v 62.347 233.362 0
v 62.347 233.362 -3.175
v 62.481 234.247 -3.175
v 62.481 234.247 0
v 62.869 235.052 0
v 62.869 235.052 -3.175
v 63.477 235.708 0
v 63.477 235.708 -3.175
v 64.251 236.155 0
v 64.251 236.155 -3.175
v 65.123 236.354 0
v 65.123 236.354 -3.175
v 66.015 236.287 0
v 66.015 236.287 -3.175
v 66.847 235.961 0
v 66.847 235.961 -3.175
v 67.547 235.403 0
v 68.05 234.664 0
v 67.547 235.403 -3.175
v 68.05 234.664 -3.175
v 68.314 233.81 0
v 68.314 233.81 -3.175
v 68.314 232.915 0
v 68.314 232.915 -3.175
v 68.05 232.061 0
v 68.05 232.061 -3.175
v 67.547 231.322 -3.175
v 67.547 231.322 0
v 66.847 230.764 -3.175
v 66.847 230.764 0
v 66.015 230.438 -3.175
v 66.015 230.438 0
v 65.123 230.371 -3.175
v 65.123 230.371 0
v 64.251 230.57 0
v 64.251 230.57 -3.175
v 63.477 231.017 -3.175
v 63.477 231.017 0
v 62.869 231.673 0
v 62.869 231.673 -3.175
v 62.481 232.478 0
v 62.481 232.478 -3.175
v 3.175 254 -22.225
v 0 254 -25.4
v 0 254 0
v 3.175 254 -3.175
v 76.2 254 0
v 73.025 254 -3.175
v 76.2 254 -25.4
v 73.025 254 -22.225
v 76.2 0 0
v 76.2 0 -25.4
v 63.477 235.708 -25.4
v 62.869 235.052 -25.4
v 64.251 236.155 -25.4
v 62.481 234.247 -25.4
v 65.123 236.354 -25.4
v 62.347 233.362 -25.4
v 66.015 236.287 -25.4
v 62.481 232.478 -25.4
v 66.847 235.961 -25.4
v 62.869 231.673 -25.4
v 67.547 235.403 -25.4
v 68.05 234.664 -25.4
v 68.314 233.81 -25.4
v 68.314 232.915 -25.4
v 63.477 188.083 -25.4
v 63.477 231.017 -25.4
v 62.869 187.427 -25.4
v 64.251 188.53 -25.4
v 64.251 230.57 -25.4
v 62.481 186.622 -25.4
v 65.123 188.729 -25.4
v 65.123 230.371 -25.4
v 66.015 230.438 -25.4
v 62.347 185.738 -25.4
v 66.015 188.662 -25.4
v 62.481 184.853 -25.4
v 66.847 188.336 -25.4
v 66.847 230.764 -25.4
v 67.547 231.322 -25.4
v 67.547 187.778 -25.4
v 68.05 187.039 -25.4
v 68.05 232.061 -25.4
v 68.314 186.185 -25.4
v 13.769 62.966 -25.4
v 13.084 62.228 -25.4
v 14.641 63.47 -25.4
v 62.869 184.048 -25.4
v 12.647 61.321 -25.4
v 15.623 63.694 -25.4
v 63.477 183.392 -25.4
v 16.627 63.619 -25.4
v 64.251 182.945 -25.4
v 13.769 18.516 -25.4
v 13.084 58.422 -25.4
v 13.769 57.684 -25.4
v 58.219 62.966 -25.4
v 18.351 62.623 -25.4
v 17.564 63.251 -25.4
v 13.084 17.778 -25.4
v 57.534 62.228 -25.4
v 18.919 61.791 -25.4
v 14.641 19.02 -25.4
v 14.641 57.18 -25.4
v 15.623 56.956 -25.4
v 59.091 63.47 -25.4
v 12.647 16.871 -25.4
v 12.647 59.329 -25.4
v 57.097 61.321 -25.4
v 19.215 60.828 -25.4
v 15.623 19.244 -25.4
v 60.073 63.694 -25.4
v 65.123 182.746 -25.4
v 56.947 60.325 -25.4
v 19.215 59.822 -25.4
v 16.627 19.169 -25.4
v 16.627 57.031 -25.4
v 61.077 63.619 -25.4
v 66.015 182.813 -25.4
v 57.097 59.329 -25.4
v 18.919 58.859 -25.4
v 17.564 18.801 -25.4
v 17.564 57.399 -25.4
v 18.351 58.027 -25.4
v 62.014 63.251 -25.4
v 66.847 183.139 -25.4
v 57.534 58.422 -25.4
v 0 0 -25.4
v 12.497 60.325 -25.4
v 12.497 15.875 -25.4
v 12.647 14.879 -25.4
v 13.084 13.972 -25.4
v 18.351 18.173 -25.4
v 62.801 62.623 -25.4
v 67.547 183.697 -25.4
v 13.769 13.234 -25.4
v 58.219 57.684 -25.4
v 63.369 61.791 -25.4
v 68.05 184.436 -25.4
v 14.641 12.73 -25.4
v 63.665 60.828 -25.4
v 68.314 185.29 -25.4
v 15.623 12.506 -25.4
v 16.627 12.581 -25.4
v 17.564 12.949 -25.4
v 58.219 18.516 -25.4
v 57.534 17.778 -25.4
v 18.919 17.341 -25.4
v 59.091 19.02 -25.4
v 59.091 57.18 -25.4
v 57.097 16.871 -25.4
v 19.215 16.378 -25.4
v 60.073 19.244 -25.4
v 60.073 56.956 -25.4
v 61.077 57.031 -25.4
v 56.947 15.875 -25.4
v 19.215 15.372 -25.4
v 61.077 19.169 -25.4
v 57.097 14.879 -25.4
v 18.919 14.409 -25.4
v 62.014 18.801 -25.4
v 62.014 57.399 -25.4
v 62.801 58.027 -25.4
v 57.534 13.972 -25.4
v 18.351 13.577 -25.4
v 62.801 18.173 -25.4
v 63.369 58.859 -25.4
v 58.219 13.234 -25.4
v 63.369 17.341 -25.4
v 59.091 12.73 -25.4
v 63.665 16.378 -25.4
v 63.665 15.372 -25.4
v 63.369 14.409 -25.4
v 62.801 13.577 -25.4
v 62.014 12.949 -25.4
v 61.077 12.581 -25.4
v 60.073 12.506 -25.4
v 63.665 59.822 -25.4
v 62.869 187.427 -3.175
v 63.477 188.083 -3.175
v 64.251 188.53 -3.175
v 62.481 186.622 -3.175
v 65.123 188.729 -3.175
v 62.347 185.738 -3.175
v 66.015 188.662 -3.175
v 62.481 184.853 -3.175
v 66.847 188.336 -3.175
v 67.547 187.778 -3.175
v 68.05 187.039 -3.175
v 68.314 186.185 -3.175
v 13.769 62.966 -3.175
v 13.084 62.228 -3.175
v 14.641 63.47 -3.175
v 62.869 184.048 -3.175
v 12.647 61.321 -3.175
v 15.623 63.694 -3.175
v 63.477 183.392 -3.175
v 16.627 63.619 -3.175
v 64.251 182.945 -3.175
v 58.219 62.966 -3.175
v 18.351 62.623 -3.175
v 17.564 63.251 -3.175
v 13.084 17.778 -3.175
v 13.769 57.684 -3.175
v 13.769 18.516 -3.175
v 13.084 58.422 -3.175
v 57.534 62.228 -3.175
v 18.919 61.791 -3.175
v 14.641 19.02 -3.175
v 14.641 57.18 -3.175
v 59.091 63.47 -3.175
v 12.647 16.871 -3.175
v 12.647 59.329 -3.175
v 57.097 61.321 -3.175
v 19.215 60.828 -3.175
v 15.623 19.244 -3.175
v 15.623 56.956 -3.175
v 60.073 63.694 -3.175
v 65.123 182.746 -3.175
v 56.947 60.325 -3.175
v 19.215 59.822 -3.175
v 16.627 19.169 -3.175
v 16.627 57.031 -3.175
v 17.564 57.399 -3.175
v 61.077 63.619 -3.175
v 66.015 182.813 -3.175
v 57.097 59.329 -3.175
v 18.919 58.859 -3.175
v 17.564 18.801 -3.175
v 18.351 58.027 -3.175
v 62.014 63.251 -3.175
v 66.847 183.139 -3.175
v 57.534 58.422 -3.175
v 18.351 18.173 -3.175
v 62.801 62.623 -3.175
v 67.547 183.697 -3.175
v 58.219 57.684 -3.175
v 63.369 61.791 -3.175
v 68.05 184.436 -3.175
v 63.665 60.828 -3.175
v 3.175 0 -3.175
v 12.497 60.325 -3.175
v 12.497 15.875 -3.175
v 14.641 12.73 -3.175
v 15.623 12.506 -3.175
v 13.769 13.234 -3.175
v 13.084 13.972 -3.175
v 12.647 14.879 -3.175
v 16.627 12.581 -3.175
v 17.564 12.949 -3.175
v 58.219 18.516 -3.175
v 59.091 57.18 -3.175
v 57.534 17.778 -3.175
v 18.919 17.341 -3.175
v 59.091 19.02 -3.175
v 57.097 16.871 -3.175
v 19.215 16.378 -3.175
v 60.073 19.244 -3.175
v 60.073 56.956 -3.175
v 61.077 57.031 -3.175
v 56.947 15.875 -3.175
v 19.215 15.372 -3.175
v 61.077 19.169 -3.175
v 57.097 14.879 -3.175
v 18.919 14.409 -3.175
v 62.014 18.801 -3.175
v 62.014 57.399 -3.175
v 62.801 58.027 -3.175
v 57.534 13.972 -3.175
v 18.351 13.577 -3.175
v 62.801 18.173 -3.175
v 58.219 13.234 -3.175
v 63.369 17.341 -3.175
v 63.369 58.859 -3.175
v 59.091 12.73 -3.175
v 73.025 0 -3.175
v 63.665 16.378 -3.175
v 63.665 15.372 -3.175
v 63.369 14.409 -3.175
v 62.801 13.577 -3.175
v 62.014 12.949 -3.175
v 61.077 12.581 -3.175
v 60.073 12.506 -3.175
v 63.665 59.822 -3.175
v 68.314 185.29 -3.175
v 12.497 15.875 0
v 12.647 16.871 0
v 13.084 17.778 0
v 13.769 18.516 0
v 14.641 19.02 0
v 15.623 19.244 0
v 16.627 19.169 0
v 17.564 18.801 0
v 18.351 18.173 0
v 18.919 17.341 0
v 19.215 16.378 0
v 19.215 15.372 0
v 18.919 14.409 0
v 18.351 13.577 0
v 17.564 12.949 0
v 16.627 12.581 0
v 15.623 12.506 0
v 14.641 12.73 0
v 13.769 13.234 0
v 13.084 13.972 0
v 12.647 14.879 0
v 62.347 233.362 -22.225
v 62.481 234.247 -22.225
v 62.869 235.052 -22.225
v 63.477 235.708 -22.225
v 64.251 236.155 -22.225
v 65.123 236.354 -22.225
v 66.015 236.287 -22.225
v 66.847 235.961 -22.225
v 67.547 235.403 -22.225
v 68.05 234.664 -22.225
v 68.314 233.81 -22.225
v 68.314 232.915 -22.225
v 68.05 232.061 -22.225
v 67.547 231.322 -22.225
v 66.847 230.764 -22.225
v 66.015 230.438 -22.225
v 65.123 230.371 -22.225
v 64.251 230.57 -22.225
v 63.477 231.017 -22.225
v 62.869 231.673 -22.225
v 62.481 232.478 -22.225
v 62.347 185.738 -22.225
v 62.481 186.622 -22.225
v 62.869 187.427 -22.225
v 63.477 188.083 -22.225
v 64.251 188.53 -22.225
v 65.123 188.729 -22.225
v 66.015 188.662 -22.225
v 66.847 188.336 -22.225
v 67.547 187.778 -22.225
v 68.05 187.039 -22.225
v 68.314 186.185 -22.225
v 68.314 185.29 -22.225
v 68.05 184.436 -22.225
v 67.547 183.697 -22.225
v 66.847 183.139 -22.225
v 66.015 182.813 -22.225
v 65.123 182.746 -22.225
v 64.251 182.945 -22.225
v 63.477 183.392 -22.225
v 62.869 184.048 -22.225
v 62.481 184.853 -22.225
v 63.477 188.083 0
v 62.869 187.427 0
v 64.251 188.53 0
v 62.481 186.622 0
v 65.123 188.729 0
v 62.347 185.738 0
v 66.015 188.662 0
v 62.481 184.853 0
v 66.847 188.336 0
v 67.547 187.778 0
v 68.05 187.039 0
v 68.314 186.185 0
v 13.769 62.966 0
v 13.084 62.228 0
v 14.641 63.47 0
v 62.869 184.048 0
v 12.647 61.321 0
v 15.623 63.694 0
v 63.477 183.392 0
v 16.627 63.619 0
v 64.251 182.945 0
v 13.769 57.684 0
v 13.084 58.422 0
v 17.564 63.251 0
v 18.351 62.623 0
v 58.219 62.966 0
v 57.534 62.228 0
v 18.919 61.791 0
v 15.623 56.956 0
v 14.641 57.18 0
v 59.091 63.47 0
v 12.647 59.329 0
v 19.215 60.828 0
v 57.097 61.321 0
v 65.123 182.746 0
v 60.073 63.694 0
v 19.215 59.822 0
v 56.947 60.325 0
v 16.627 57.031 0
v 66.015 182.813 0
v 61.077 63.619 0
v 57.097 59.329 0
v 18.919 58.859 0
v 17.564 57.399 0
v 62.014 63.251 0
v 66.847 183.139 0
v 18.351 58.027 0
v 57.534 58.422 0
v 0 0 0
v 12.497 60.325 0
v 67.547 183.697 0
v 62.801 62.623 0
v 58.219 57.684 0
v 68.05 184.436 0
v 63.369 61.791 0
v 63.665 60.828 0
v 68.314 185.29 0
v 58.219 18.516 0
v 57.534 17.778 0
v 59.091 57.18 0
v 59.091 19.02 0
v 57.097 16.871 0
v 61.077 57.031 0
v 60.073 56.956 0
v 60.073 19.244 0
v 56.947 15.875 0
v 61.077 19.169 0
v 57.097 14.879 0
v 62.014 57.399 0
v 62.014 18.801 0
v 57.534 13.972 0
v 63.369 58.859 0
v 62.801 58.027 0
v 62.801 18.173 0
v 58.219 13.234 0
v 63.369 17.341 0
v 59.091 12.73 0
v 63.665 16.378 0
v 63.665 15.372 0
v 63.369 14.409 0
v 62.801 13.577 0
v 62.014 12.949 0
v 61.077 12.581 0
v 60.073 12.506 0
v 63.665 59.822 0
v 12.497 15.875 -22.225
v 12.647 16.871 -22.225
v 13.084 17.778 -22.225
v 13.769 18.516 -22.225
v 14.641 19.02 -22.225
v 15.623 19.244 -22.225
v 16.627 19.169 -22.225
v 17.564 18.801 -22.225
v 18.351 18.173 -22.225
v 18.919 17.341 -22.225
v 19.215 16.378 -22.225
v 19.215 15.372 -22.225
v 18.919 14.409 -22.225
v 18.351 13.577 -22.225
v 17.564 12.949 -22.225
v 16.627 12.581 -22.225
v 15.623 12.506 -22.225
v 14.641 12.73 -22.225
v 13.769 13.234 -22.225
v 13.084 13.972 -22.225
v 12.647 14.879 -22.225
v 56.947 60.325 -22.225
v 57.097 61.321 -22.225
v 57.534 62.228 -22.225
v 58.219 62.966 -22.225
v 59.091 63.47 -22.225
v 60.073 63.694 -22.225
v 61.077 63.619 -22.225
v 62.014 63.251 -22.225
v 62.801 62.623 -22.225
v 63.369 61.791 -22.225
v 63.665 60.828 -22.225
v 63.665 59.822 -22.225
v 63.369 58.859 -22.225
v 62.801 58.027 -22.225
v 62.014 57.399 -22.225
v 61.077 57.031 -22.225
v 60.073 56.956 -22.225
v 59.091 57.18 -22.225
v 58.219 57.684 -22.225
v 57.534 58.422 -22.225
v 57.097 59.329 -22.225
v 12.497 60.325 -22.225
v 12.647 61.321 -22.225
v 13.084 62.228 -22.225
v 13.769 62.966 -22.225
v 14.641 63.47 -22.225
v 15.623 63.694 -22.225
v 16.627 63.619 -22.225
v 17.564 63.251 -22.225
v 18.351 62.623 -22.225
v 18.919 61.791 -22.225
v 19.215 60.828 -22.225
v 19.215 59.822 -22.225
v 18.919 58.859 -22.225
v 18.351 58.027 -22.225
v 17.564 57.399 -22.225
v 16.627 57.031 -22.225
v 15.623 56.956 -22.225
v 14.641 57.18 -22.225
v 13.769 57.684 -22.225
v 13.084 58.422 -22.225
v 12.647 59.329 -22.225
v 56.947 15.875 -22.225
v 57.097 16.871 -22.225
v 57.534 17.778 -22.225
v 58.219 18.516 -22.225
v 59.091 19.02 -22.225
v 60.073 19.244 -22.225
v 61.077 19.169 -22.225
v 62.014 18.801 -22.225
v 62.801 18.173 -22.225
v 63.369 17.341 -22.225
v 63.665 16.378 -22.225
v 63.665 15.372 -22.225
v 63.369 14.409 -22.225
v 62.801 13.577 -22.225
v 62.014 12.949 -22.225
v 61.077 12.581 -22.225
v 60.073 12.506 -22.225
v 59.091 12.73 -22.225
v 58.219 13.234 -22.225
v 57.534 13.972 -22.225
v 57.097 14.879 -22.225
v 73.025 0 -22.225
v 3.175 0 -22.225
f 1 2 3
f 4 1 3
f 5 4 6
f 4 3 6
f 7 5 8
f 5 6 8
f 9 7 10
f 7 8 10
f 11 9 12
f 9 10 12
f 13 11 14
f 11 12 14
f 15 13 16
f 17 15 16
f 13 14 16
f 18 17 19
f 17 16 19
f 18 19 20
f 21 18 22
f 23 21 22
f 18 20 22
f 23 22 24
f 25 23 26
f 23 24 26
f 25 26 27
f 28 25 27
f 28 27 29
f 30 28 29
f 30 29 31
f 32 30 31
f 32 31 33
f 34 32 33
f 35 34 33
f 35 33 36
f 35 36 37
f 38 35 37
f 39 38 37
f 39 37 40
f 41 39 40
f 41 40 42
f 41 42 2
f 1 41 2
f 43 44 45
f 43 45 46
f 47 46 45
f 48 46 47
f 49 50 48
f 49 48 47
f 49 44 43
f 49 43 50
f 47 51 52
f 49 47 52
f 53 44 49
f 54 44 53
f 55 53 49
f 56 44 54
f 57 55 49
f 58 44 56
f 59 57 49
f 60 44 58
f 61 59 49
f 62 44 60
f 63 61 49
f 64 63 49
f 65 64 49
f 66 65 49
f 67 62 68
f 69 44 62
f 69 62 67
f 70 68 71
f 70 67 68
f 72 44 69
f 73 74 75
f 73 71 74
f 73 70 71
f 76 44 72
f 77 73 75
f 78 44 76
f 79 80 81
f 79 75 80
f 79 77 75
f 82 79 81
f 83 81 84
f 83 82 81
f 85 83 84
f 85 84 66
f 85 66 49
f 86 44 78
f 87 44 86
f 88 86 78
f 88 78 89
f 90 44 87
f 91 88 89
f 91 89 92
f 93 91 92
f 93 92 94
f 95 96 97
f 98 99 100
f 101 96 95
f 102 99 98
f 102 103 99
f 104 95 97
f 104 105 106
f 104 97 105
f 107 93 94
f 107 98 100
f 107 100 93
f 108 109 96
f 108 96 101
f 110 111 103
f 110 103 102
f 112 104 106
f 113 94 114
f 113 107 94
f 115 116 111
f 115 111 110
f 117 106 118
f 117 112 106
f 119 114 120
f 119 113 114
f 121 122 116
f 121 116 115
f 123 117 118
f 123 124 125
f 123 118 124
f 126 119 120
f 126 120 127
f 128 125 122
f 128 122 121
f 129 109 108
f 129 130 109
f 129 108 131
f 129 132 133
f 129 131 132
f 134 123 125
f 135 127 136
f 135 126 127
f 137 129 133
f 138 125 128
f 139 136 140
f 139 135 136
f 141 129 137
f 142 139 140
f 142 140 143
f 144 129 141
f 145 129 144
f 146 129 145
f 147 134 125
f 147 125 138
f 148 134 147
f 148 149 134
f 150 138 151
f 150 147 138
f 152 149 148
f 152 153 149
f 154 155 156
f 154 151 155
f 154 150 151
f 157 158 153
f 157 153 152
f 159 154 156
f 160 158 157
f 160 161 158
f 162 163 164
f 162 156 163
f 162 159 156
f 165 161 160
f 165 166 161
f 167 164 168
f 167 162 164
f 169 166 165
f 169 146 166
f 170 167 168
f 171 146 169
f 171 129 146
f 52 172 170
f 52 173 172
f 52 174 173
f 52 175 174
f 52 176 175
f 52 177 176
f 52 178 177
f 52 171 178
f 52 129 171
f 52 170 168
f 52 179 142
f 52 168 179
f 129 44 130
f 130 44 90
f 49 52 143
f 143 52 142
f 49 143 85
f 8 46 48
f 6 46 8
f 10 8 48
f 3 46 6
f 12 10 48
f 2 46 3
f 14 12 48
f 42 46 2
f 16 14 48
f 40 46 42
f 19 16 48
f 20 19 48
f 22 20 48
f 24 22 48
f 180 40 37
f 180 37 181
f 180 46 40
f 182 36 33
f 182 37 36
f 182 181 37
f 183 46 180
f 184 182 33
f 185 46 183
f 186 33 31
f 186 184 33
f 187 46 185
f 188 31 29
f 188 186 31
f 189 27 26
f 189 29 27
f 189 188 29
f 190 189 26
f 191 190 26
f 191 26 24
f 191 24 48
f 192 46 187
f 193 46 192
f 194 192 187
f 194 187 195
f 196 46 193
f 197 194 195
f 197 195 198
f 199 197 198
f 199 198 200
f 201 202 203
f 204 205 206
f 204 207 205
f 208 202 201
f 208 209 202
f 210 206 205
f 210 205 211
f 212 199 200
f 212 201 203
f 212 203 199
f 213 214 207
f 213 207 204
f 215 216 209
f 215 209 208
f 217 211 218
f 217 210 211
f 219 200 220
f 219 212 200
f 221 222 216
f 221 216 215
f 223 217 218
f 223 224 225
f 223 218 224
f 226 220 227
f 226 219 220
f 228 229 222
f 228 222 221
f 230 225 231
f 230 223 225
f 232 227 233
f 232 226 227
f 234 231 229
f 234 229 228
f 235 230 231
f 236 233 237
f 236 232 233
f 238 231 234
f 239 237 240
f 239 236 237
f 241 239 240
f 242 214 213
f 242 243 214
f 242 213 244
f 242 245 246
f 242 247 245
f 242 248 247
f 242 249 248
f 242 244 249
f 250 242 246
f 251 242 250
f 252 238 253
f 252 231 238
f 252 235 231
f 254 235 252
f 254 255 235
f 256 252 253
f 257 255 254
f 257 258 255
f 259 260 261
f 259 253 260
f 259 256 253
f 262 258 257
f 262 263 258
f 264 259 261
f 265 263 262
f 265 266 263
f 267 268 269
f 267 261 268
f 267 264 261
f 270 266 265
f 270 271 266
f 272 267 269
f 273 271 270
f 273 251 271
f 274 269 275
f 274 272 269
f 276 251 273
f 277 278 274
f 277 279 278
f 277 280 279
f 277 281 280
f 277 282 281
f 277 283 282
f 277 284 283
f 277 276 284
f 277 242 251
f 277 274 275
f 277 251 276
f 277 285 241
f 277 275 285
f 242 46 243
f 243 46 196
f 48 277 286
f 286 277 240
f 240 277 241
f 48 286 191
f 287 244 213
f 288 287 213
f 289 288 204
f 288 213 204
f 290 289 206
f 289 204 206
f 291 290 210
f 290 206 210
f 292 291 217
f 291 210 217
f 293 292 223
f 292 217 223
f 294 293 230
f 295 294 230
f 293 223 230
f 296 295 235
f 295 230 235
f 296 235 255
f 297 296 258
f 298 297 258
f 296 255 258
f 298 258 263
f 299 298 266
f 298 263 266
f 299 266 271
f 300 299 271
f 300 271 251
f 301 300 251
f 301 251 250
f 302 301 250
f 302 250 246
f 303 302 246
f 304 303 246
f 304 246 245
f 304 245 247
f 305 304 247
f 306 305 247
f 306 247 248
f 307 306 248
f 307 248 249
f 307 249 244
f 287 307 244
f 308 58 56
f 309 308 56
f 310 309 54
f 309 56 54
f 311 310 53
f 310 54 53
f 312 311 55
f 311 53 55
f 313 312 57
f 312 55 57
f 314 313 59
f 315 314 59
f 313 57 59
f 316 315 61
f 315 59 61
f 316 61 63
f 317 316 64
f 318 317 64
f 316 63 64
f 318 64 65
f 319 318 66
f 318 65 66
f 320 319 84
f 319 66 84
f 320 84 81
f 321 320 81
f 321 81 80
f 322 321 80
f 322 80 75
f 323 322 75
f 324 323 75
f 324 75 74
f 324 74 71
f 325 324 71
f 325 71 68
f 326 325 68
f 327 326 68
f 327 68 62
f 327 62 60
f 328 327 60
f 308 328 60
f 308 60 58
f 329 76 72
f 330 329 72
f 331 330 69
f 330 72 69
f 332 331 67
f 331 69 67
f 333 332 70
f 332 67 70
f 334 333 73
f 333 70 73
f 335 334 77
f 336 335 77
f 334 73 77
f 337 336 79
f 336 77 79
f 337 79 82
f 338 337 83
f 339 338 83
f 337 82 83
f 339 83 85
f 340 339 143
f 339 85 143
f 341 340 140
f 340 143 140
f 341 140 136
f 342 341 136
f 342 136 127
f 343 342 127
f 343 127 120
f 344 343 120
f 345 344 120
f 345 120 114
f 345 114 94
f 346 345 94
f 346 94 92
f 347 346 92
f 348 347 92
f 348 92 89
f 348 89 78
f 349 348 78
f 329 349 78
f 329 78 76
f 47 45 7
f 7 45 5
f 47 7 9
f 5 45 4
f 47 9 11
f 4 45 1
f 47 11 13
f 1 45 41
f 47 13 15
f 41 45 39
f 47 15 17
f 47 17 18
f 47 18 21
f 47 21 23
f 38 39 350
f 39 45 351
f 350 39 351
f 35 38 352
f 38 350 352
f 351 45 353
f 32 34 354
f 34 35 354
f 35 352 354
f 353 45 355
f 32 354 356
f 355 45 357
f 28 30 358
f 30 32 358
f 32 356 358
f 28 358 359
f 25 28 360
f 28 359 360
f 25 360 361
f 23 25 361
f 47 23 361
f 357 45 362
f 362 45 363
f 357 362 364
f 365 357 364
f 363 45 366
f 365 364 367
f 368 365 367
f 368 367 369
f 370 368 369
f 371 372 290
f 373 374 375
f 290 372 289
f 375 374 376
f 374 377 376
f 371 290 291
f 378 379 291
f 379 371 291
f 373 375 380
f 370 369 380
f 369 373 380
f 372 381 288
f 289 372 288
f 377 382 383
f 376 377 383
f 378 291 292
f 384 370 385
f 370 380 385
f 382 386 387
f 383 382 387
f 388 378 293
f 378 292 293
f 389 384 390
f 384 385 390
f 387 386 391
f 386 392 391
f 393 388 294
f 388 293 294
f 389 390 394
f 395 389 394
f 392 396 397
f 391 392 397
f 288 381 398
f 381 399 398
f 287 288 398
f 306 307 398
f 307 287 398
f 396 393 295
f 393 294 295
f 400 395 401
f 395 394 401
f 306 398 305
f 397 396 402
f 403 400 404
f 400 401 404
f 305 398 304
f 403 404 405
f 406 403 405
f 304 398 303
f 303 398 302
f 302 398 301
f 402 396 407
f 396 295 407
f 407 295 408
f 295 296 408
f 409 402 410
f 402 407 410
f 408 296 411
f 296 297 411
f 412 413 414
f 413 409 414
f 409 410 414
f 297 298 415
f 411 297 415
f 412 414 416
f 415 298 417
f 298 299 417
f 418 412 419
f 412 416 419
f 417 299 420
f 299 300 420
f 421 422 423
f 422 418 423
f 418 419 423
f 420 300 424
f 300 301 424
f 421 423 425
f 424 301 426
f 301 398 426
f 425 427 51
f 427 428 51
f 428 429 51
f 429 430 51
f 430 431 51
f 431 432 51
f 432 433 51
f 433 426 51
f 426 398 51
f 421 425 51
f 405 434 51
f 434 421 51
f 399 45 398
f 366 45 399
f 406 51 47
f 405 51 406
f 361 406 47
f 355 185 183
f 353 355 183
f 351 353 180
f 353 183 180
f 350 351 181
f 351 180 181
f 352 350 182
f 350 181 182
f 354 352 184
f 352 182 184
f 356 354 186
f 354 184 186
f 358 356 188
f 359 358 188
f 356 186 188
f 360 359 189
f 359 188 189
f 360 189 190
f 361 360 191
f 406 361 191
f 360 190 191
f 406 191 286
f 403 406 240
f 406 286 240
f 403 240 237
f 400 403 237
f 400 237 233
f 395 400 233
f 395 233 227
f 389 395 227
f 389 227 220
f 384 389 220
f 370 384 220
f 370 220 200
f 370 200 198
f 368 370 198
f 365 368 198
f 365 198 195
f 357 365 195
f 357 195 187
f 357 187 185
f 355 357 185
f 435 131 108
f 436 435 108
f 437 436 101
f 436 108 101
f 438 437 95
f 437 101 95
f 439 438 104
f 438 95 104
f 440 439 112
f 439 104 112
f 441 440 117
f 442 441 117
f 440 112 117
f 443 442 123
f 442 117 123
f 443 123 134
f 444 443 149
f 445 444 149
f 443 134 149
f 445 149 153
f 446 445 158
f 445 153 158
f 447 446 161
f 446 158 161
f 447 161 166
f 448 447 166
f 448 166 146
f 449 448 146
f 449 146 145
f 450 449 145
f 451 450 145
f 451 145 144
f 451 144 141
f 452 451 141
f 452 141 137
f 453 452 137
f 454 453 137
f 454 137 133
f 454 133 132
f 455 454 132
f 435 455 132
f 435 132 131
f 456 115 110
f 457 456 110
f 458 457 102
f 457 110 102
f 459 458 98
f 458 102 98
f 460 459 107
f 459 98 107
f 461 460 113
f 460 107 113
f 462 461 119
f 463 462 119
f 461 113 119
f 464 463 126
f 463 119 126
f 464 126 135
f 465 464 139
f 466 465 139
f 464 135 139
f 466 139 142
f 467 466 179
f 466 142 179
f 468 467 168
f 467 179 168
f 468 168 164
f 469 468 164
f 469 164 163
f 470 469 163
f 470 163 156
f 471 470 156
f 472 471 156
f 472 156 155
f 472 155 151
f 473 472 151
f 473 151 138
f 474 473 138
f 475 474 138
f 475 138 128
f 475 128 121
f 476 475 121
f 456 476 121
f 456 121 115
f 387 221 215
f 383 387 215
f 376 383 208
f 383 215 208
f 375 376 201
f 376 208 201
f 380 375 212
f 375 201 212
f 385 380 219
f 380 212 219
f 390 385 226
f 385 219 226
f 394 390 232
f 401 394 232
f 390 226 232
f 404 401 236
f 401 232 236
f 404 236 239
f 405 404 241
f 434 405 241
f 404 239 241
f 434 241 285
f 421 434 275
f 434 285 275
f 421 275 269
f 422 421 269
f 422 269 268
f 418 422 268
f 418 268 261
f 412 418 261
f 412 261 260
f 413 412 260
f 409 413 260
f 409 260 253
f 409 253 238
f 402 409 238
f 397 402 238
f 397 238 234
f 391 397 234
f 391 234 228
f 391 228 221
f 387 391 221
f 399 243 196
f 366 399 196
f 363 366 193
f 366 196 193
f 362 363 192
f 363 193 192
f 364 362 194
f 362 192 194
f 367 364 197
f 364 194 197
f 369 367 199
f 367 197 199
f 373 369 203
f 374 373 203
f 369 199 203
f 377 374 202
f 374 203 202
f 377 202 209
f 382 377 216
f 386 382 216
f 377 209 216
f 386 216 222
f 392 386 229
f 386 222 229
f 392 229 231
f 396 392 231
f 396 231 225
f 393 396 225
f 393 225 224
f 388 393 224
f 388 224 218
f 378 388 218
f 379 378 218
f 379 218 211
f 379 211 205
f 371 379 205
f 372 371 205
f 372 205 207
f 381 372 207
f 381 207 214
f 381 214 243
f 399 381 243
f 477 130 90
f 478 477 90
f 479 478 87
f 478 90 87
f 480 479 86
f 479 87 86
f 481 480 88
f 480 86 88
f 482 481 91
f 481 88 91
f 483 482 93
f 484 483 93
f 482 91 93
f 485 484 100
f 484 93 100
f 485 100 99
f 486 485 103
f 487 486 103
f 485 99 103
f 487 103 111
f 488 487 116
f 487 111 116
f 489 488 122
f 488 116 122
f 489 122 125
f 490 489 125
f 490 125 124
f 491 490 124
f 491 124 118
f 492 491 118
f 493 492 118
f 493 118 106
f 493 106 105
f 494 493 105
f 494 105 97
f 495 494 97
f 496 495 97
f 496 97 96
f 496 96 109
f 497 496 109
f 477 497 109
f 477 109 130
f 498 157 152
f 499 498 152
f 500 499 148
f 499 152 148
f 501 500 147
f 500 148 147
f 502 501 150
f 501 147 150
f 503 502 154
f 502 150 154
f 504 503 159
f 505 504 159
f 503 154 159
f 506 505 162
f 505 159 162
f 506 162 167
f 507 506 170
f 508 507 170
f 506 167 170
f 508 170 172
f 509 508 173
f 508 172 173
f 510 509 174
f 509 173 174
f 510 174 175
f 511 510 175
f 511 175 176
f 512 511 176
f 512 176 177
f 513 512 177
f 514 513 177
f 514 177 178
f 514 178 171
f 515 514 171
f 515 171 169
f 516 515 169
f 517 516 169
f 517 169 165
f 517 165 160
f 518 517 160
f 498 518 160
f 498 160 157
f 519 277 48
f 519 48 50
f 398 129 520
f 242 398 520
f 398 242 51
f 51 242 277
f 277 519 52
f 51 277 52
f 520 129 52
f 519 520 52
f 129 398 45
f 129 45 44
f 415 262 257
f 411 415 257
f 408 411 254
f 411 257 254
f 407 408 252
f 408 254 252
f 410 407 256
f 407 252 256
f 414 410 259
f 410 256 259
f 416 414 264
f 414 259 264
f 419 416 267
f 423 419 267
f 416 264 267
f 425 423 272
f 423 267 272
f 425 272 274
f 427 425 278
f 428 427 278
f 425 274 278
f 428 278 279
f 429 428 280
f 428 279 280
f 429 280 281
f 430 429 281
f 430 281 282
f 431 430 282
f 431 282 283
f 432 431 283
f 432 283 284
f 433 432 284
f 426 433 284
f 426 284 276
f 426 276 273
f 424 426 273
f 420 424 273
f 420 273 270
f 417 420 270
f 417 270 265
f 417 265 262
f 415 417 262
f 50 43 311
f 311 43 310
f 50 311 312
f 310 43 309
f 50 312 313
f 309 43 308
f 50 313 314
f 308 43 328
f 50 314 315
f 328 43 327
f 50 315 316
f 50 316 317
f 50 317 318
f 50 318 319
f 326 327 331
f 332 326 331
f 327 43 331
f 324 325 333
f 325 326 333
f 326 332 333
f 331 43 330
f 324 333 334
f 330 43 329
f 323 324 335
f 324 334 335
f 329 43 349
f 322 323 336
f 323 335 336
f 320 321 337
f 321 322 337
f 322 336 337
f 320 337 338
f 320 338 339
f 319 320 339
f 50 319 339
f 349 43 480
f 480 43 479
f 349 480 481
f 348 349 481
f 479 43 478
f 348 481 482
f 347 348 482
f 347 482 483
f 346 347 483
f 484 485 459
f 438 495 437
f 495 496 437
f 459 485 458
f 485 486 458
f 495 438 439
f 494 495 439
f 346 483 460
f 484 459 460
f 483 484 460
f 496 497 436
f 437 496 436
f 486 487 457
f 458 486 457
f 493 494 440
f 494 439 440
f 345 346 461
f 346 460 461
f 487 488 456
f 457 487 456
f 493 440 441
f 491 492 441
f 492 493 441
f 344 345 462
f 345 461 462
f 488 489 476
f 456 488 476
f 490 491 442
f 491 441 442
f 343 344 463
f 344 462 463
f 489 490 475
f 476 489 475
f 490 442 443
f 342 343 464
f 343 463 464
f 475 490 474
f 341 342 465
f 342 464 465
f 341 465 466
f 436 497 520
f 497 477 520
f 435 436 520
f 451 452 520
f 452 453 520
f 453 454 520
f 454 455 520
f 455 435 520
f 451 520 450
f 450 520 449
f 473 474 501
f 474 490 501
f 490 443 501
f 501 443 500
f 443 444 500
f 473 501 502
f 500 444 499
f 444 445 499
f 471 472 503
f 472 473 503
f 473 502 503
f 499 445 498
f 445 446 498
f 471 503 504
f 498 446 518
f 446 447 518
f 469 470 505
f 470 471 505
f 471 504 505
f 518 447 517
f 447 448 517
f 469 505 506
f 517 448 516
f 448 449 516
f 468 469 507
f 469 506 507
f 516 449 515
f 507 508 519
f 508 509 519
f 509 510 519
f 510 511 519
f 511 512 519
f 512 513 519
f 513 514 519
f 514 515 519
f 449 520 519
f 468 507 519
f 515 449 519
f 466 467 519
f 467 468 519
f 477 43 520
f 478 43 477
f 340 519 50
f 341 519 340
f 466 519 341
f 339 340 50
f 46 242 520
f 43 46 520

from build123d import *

# Parameters (mm, degrees)
SKETCH1_W           = 76.2
SKETCH1_H           = 25.4
SKETCH1_W_2         = 69.85
SKETCH1_H_2         = 19.05
BOSS_EXTRUDE1_DEPTH = 254
SKETCH2_R           = 3.3782
CUT_EXTRUDE1_DEPTH  = 26.4
SKETCH3_R           = 3
CUT_EXTRUDE2_DEPTH  = 26.4


with BuildPart() as part:
    # Sketch1 → Boss-Extrude1 (new body)
    with BuildSketch(Plane(origin=(0, 0, 0), x_dir=(1, 0, 0), z_dir=(0, 1, 0))):
        with Locations((38.1, 12.7)):
            Rectangle(SKETCH1_W, SKETCH1_H)
        with Locations((38.1, 12.7)):
            Rectangle(SKETCH1_W_2, SKETCH1_H_2, mode=Mode.SUBTRACT)
    extrude(amount=BOSS_EXTRUDE1_DEPTH)

    # Sketch2 → Cut-Extrude1 (cut, through all)
    with BuildSketch(Plane(origin=(0, 0, -25.4), x_dir=(-1, 0, 0), z_dir=(0, 0, -1))):
        with Locations((-60.325, 15.875)):
            Circle(SKETCH2_R)
        with Locations((-15.875, 15.875)):
            Circle(SKETCH2_R)
        with Locations((-15.875, 60.325)):
            Circle(SKETCH2_R)
        with Locations((-60.325, 60.325)):
            Circle(SKETCH2_R)
    extrude(amount=-CUT_EXTRUDE1_DEPTH, mode=Mode.SUBTRACT)

    # Sketch3 → Cut-Extrude2 (cut, through all)
    with BuildSketch(Plane(origin=(0, 0, -25.4), x_dir=(-1, 0, 0), z_dir=(0, 0, -1))):
        with Locations((-65.347432125, 185.7375)):
            Circle(SKETCH3_R)
        with Locations((-65.347432125, 233.3625)):
            Circle(SKETCH3_R)
    extrude(amount=-CUT_EXTRUDE2_DEPTH, mode=Mode.SUBTRACT)


solid = part.part
